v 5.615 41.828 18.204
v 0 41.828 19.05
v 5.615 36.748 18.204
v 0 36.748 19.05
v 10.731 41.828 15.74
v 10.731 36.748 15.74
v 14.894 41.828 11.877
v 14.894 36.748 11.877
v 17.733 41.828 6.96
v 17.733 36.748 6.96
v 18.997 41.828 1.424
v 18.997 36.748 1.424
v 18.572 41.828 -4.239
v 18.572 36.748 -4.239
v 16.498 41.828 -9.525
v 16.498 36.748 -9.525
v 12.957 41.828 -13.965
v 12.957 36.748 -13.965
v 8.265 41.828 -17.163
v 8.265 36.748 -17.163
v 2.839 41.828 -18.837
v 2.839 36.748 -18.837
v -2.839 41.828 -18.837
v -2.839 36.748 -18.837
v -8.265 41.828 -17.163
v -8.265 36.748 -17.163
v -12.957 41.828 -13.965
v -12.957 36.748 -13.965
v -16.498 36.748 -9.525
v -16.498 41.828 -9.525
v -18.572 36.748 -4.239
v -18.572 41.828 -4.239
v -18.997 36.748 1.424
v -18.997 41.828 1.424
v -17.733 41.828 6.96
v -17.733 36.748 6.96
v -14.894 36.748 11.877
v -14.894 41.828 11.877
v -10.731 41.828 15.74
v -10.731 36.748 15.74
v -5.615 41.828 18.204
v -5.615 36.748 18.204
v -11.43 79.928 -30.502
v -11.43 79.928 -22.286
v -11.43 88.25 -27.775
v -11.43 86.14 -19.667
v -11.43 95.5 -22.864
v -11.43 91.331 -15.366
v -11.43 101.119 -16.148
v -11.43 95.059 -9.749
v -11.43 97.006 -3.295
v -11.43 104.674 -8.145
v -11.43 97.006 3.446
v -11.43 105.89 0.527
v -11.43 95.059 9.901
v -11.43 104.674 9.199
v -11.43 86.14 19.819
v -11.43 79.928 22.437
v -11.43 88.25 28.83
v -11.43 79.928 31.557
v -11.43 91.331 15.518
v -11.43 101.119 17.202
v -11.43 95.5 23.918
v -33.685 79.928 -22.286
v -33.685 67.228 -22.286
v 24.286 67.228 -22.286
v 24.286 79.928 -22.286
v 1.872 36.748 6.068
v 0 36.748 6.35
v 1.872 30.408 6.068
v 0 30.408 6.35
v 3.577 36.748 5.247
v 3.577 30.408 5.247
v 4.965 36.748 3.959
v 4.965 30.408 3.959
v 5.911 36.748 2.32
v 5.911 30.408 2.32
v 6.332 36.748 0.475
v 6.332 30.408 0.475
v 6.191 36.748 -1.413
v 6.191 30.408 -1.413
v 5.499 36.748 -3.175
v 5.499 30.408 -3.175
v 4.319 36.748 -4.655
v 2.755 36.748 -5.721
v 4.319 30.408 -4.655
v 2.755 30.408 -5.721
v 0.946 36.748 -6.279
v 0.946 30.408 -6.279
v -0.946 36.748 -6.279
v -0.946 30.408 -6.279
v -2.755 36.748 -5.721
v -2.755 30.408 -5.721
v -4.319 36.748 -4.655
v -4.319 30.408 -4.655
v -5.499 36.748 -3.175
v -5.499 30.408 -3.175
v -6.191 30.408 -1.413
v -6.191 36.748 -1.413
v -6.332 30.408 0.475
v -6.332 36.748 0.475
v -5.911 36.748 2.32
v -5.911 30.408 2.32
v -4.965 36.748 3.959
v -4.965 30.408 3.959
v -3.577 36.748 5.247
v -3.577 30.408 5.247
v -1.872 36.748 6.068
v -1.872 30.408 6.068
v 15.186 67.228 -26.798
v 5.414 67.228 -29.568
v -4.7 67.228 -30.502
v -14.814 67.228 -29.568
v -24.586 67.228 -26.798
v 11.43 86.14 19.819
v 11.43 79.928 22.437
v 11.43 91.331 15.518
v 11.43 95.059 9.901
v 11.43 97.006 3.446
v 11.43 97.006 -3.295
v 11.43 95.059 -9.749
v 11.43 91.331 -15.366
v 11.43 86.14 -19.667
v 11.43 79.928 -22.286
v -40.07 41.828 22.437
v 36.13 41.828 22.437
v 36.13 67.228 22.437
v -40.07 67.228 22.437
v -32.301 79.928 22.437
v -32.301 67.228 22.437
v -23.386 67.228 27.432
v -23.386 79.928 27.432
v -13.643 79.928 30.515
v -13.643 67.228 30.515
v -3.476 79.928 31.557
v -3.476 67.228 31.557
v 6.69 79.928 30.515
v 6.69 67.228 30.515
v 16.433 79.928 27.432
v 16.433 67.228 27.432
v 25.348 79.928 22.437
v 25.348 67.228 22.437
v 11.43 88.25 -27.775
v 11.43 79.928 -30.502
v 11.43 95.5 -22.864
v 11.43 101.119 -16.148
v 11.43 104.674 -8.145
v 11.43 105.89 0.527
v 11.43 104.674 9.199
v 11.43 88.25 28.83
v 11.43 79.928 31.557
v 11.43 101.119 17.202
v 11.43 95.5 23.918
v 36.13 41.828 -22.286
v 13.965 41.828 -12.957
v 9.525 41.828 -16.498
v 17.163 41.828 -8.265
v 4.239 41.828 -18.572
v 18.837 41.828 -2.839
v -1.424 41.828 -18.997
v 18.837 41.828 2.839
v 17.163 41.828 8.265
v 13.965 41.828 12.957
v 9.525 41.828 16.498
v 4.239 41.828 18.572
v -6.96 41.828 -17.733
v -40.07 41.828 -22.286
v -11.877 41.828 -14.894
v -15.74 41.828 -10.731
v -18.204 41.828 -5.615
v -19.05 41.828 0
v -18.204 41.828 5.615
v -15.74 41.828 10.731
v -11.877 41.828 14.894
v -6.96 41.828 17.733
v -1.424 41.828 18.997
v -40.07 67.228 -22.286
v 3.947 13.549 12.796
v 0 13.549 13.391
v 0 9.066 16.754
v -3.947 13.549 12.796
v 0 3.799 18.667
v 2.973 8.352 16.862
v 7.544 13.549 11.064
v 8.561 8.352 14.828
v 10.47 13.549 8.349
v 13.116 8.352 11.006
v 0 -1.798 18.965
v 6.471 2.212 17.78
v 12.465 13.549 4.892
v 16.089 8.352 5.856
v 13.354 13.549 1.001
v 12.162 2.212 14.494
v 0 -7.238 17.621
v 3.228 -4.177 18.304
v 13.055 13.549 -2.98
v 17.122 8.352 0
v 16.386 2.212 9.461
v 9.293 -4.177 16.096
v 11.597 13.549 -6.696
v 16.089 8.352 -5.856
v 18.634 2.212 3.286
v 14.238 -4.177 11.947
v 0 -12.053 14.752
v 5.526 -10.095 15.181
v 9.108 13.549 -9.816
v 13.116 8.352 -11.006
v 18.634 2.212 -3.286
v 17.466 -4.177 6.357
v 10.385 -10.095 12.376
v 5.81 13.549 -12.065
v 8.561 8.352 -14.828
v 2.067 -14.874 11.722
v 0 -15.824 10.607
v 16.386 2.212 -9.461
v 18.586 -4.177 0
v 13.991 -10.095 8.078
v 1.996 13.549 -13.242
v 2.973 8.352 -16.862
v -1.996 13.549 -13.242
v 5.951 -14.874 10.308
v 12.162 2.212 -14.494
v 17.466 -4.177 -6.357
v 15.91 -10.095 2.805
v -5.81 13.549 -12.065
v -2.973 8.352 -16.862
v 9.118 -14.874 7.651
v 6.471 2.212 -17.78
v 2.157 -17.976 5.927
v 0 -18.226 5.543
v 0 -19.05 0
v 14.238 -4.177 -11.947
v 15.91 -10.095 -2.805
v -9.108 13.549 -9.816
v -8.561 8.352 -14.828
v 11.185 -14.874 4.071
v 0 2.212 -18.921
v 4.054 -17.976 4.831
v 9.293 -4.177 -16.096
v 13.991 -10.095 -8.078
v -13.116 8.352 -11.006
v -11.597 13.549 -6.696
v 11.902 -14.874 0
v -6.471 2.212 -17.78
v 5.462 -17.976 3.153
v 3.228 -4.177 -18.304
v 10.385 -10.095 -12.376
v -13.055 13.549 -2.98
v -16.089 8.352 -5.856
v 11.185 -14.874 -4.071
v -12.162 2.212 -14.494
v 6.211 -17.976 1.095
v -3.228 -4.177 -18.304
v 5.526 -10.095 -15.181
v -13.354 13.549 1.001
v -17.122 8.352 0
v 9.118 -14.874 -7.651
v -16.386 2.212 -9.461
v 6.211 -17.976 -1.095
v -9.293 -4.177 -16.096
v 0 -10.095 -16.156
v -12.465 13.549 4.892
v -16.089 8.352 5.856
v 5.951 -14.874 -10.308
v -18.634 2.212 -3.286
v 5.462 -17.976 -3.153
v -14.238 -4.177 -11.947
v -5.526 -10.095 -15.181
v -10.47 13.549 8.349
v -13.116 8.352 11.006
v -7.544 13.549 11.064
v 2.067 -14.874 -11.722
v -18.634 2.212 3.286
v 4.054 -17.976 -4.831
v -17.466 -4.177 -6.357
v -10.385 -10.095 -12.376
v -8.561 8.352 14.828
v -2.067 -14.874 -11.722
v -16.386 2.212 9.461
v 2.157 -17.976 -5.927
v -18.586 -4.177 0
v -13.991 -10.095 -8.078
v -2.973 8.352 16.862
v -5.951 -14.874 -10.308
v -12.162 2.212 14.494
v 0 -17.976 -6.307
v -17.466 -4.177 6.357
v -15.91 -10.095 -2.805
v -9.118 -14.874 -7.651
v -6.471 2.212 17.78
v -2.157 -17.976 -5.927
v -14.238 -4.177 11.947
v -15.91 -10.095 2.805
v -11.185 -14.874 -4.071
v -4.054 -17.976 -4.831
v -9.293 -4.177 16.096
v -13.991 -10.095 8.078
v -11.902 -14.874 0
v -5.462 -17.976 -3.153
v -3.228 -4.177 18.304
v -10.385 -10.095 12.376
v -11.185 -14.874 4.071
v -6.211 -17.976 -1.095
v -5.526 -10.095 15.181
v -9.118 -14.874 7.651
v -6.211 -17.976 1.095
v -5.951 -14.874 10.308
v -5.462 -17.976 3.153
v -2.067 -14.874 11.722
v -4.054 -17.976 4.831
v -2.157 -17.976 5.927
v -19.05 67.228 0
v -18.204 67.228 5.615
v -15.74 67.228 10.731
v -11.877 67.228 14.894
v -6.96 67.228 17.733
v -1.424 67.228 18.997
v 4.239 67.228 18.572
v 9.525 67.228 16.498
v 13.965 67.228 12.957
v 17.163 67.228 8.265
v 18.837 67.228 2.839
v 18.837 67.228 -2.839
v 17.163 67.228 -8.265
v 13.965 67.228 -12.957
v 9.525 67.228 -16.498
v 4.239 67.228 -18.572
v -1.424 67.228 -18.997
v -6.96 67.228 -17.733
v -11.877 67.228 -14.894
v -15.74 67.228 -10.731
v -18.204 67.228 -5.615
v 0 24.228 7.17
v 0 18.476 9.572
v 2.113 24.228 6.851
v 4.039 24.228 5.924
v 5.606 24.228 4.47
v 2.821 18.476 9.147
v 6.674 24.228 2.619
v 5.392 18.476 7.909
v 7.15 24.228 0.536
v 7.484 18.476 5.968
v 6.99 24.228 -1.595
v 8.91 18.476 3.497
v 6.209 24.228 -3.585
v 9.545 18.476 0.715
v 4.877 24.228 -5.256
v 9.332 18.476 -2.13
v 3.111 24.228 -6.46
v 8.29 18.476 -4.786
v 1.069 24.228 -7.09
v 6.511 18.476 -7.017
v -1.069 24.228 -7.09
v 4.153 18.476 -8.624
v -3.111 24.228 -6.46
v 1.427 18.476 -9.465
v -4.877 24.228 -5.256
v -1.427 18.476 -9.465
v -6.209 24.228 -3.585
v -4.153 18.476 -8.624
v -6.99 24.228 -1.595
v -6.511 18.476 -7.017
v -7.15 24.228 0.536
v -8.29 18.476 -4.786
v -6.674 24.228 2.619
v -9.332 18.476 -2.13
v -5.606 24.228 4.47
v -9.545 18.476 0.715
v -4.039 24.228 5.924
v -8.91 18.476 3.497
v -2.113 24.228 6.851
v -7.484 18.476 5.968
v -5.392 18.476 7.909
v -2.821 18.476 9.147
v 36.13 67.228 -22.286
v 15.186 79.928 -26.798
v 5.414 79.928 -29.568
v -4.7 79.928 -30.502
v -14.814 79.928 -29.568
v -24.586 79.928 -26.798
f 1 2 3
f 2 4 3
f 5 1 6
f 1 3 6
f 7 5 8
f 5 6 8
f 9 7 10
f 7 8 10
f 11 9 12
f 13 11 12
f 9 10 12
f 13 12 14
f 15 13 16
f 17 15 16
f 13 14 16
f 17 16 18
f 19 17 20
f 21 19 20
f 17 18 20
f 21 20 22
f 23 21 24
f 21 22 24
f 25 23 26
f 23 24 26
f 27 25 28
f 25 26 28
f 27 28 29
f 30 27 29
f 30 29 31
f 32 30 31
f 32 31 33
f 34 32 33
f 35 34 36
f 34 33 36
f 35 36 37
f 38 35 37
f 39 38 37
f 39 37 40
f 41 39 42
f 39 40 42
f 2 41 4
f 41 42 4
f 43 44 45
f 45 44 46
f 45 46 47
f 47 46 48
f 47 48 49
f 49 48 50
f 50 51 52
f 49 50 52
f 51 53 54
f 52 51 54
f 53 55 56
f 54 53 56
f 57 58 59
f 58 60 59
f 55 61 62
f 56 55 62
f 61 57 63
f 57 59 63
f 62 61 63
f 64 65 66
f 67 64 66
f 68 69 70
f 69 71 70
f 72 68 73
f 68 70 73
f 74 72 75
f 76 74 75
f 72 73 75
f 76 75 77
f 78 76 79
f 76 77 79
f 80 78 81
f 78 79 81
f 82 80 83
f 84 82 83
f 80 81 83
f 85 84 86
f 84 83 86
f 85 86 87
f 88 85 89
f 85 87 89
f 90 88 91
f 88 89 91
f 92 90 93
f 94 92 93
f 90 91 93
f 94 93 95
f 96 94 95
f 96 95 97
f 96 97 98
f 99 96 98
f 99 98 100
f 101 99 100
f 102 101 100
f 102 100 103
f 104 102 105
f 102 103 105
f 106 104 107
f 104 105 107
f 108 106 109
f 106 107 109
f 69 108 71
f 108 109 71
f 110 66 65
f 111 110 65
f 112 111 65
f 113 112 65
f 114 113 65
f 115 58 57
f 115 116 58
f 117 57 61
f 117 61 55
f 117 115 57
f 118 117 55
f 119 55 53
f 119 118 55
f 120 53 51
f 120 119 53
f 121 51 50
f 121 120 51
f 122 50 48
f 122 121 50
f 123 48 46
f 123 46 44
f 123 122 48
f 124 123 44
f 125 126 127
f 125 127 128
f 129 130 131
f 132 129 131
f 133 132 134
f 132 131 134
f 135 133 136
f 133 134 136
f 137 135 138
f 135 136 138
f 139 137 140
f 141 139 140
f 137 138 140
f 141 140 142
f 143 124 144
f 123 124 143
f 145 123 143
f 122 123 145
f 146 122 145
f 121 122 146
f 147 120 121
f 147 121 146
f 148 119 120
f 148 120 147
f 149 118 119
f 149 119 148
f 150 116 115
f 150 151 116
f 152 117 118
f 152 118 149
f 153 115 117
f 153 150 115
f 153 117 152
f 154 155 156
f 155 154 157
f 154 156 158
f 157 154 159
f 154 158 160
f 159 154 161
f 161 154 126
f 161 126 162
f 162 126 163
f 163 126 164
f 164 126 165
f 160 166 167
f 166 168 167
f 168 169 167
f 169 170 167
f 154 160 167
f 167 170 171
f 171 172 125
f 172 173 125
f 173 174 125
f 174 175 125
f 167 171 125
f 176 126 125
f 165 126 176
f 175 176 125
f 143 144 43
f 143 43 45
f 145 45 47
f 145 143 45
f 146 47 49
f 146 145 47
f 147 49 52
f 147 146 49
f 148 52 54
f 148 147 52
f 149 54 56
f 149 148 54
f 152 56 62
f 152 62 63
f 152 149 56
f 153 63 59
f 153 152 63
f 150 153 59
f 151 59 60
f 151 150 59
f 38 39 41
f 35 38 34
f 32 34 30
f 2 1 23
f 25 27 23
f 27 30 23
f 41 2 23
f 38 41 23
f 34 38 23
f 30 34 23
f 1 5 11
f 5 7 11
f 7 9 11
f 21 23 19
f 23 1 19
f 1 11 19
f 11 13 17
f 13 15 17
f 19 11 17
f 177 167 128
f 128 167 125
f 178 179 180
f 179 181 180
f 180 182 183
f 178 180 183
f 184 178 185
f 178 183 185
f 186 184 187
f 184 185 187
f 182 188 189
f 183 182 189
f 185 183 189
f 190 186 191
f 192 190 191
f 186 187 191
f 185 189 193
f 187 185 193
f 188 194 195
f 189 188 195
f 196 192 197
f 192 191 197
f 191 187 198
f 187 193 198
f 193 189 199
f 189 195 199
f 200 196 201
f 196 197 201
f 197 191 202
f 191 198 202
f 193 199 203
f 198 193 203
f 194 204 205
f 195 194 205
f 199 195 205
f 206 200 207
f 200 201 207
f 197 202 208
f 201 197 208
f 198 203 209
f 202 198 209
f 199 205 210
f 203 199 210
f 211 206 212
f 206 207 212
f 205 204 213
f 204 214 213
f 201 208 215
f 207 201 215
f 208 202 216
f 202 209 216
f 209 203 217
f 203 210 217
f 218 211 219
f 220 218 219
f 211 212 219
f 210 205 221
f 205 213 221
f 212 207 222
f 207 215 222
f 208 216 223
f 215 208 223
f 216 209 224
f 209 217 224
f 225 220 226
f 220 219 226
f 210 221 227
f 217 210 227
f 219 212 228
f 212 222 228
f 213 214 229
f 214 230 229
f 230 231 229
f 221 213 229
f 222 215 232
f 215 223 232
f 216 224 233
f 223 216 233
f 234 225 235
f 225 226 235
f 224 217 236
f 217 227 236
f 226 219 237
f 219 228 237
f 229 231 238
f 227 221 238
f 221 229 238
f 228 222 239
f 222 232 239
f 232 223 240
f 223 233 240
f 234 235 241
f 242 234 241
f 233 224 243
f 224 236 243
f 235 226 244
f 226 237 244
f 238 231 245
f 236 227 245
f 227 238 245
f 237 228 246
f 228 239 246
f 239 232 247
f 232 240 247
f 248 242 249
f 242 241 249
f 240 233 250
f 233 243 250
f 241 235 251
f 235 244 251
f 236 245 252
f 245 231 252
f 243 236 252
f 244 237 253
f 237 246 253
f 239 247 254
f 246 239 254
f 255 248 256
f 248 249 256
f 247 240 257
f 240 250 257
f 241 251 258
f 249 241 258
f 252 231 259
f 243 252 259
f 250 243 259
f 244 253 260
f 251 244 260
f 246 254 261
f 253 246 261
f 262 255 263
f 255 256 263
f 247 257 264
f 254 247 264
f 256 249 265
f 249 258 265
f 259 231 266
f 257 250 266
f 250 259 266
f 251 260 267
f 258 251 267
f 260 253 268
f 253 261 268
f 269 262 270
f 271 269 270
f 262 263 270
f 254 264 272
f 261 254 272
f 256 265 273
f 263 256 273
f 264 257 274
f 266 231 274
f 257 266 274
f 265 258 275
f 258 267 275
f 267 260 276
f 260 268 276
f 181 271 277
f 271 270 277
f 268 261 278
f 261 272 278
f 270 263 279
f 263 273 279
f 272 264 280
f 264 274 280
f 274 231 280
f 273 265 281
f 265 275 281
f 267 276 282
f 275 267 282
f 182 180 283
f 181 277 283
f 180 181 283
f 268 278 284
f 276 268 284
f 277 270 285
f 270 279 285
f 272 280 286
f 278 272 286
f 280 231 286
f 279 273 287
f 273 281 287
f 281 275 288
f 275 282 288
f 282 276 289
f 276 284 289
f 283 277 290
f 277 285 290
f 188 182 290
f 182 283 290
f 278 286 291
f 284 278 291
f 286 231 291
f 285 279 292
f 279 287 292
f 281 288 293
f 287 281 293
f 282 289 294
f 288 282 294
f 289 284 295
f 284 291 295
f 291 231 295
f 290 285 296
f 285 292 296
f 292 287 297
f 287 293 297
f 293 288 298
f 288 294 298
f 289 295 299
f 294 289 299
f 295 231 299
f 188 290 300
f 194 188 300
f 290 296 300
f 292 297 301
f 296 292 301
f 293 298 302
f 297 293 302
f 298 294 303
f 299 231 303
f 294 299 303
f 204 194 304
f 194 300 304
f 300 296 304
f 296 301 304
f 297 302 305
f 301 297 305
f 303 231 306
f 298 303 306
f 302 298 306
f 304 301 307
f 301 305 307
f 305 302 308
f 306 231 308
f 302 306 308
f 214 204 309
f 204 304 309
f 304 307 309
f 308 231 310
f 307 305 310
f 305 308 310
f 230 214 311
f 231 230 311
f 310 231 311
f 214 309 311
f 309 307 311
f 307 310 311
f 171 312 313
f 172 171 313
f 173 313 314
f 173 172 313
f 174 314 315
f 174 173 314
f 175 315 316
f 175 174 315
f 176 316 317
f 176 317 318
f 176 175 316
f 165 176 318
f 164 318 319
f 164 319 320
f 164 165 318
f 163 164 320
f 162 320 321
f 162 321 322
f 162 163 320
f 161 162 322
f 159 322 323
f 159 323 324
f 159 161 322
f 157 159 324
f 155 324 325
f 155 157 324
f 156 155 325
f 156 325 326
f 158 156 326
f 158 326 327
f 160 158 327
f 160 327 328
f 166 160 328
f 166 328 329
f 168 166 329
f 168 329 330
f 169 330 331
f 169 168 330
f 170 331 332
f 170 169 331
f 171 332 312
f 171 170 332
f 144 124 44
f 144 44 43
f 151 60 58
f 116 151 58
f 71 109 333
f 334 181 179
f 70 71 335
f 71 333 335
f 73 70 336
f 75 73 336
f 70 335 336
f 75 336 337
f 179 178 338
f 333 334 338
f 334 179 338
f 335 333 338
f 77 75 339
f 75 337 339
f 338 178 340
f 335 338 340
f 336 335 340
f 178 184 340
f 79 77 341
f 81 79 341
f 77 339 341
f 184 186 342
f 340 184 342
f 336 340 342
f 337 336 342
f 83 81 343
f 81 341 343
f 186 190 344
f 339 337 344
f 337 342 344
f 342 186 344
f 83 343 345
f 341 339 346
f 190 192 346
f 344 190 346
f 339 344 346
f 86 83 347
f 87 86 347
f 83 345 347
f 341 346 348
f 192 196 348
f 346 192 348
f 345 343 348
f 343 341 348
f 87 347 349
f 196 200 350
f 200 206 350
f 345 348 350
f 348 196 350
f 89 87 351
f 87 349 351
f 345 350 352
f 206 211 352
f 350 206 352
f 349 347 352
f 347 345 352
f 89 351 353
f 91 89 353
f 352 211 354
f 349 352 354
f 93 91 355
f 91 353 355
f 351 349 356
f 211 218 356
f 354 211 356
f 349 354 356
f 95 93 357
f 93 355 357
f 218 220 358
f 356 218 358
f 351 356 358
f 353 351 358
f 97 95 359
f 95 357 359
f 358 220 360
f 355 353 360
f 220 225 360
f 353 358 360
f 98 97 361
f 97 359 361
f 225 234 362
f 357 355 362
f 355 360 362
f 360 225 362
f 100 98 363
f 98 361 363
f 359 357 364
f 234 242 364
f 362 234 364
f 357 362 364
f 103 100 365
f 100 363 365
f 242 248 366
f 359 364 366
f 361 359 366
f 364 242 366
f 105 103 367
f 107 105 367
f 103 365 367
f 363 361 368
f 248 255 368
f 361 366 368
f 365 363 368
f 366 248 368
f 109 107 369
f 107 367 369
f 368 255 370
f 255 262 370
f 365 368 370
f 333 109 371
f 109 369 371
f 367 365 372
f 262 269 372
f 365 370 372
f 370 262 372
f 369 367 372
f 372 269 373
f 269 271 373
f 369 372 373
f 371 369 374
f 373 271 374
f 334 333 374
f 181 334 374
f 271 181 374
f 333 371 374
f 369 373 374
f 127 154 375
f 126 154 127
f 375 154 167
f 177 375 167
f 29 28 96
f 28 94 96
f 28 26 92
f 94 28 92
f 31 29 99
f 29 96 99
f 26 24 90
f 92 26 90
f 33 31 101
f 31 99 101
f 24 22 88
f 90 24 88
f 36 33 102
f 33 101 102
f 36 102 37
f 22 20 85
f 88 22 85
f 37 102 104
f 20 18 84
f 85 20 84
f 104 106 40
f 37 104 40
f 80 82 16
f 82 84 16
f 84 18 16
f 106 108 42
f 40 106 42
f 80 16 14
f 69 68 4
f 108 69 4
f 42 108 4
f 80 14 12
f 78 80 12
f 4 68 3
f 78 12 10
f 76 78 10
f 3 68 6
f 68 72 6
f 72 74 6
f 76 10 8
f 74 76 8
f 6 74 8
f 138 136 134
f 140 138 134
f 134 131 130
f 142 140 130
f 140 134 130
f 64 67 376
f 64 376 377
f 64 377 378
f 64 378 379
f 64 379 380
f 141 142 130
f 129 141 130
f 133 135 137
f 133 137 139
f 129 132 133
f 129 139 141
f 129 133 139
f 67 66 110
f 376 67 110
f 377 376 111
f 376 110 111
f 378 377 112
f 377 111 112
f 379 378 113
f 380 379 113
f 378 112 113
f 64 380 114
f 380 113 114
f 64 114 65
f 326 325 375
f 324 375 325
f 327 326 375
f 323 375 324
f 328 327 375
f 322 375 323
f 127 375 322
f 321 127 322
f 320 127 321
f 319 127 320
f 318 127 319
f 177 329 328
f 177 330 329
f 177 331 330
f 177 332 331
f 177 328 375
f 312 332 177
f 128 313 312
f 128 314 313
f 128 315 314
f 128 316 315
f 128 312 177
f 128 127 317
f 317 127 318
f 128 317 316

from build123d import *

# Parameters (mm, degrees)
F2_W     = 76.2
F2_H     = 44.7226946513
F2_R     = 19.05
F3_DEPTH = 25.4
F5_DEPTH = 12.7
F7_DEPTH = 11.43


with BuildPart() as f1:
    # F0 (on Right) → F1 (revolve)
    with BuildSketch(Plane.YZ):
        with BuildLine():
            Line((-19.05, 0), (19.05, 0))
            ThreePointArc((19.05, 0), (17.6212086291, 7.2384740416), (13.5491594277, 13.3911455374))
            ThreePointArc((13.5491594277, 13.3911455374), (-7.2384740416, 17.6212086291), (-19.05, 0))
        make_face()
        with BuildLine():
            ThreePointArc((13.5491594277, 13.3911455374), (17.6212086291, 7.2384740416), (19.05, 0))
            Line((19.05, 0), (36.7481327612, 0))
            Line((36.7481327612, 0), (36.7481327612, 6.35))
            Line((36.7481327612, 6.35), (30.4079784819, 6.35))
            ThreePointArc((30.4079784819, 6.35), (21.2729153954, 8.1810059772), (13.5491594277, 13.3911455374))
        make_face()
        Polygon((36.7481327612, 6.35), (36.7481327612, 0), (41.8281327612, 0), (41.8281327612, 19.05), (36.7481327612, 19.05), align=None)
    revolve(axis=Axis((0, 11.3890663806, 0), (0, 1, 0)))


with BuildPart() as f3:
    # F2 (on face) → F3 (new body)
    with BuildSketch(Plane(origin=(0, 41.8281327612, 0), x_dir=(-1, 0, 0), z_dir=(0, 1, 0))):
        with Locations((1.9701402634, 0.075773336)):
            Rectangle(F2_W, F2_H)
        Circle(F2_R, mode=Mode.SUBTRACT)
    extrude(amount=F3_DEPTH)


with BuildPart() as f5:
    # F4 (on face) → F5 (new body)
    with BuildSketch(Plane(origin=(0, 67.2281327612, 0), x_dir=(-1, 0, 0), z_dir=(0, 1, 0))):
        with BuildLine():
            Line((33.6851105094, -22.2855739896), (-24.2860000581, -22.2855739896))
            ThreePointArc((-24.2860000581, -22.2855739896), (4.6995552257, -30.5020236554), (33.6851105094, -22.2855739896))
        make_face()
    extrude(amount=F5_DEPTH)


with BuildPart() as f5b:
    # F4 (on face) → F5, piece 2 (new body)
    with BuildSketch(Plane(origin=(0, 67.2281327612, 0), x_dir=(-1, 0, 0), z_dir=(0, 1, 0))):
        with BuildLine():
            ThreePointArc((32.3013700545, 22.4371206616), (3.4764967859, 31.5568124537), (-25.3483764827, 22.4371206616))
            Line((-25.3483764827, 22.4371206616), (32.3013700545, 22.4371206616))
        make_face()
    extrude(amount=F5_DEPTH)


with BuildPart() as f7:
    # F6 (on Right) → F7 (new body, symmetric)
    with BuildSketch(Plane.YZ):
        with BuildLine():
            ThreePointArc((79.9281327612, 22.4371206616), (97.2532908221, 0.075773336), (79.9281327612, -22.2855739896))
            Line((79.9281327612, -22.2855739896), (79.9281327612, -30.5020236554))
            ThreePointArc((79.9281327612, -30.5020236554), (105.8902724062, 0.5273943992), (79.9281327612, 31.5568124537))
            Line((79.9281327612, 31.5568124537), (79.9281327612, 22.4371206616))
        make_face()
    extrude(amount=F7_DEPTH, both=True)


solid = Compound([f1.part, f3.part, f5.part, f5b.part, f7.part])
